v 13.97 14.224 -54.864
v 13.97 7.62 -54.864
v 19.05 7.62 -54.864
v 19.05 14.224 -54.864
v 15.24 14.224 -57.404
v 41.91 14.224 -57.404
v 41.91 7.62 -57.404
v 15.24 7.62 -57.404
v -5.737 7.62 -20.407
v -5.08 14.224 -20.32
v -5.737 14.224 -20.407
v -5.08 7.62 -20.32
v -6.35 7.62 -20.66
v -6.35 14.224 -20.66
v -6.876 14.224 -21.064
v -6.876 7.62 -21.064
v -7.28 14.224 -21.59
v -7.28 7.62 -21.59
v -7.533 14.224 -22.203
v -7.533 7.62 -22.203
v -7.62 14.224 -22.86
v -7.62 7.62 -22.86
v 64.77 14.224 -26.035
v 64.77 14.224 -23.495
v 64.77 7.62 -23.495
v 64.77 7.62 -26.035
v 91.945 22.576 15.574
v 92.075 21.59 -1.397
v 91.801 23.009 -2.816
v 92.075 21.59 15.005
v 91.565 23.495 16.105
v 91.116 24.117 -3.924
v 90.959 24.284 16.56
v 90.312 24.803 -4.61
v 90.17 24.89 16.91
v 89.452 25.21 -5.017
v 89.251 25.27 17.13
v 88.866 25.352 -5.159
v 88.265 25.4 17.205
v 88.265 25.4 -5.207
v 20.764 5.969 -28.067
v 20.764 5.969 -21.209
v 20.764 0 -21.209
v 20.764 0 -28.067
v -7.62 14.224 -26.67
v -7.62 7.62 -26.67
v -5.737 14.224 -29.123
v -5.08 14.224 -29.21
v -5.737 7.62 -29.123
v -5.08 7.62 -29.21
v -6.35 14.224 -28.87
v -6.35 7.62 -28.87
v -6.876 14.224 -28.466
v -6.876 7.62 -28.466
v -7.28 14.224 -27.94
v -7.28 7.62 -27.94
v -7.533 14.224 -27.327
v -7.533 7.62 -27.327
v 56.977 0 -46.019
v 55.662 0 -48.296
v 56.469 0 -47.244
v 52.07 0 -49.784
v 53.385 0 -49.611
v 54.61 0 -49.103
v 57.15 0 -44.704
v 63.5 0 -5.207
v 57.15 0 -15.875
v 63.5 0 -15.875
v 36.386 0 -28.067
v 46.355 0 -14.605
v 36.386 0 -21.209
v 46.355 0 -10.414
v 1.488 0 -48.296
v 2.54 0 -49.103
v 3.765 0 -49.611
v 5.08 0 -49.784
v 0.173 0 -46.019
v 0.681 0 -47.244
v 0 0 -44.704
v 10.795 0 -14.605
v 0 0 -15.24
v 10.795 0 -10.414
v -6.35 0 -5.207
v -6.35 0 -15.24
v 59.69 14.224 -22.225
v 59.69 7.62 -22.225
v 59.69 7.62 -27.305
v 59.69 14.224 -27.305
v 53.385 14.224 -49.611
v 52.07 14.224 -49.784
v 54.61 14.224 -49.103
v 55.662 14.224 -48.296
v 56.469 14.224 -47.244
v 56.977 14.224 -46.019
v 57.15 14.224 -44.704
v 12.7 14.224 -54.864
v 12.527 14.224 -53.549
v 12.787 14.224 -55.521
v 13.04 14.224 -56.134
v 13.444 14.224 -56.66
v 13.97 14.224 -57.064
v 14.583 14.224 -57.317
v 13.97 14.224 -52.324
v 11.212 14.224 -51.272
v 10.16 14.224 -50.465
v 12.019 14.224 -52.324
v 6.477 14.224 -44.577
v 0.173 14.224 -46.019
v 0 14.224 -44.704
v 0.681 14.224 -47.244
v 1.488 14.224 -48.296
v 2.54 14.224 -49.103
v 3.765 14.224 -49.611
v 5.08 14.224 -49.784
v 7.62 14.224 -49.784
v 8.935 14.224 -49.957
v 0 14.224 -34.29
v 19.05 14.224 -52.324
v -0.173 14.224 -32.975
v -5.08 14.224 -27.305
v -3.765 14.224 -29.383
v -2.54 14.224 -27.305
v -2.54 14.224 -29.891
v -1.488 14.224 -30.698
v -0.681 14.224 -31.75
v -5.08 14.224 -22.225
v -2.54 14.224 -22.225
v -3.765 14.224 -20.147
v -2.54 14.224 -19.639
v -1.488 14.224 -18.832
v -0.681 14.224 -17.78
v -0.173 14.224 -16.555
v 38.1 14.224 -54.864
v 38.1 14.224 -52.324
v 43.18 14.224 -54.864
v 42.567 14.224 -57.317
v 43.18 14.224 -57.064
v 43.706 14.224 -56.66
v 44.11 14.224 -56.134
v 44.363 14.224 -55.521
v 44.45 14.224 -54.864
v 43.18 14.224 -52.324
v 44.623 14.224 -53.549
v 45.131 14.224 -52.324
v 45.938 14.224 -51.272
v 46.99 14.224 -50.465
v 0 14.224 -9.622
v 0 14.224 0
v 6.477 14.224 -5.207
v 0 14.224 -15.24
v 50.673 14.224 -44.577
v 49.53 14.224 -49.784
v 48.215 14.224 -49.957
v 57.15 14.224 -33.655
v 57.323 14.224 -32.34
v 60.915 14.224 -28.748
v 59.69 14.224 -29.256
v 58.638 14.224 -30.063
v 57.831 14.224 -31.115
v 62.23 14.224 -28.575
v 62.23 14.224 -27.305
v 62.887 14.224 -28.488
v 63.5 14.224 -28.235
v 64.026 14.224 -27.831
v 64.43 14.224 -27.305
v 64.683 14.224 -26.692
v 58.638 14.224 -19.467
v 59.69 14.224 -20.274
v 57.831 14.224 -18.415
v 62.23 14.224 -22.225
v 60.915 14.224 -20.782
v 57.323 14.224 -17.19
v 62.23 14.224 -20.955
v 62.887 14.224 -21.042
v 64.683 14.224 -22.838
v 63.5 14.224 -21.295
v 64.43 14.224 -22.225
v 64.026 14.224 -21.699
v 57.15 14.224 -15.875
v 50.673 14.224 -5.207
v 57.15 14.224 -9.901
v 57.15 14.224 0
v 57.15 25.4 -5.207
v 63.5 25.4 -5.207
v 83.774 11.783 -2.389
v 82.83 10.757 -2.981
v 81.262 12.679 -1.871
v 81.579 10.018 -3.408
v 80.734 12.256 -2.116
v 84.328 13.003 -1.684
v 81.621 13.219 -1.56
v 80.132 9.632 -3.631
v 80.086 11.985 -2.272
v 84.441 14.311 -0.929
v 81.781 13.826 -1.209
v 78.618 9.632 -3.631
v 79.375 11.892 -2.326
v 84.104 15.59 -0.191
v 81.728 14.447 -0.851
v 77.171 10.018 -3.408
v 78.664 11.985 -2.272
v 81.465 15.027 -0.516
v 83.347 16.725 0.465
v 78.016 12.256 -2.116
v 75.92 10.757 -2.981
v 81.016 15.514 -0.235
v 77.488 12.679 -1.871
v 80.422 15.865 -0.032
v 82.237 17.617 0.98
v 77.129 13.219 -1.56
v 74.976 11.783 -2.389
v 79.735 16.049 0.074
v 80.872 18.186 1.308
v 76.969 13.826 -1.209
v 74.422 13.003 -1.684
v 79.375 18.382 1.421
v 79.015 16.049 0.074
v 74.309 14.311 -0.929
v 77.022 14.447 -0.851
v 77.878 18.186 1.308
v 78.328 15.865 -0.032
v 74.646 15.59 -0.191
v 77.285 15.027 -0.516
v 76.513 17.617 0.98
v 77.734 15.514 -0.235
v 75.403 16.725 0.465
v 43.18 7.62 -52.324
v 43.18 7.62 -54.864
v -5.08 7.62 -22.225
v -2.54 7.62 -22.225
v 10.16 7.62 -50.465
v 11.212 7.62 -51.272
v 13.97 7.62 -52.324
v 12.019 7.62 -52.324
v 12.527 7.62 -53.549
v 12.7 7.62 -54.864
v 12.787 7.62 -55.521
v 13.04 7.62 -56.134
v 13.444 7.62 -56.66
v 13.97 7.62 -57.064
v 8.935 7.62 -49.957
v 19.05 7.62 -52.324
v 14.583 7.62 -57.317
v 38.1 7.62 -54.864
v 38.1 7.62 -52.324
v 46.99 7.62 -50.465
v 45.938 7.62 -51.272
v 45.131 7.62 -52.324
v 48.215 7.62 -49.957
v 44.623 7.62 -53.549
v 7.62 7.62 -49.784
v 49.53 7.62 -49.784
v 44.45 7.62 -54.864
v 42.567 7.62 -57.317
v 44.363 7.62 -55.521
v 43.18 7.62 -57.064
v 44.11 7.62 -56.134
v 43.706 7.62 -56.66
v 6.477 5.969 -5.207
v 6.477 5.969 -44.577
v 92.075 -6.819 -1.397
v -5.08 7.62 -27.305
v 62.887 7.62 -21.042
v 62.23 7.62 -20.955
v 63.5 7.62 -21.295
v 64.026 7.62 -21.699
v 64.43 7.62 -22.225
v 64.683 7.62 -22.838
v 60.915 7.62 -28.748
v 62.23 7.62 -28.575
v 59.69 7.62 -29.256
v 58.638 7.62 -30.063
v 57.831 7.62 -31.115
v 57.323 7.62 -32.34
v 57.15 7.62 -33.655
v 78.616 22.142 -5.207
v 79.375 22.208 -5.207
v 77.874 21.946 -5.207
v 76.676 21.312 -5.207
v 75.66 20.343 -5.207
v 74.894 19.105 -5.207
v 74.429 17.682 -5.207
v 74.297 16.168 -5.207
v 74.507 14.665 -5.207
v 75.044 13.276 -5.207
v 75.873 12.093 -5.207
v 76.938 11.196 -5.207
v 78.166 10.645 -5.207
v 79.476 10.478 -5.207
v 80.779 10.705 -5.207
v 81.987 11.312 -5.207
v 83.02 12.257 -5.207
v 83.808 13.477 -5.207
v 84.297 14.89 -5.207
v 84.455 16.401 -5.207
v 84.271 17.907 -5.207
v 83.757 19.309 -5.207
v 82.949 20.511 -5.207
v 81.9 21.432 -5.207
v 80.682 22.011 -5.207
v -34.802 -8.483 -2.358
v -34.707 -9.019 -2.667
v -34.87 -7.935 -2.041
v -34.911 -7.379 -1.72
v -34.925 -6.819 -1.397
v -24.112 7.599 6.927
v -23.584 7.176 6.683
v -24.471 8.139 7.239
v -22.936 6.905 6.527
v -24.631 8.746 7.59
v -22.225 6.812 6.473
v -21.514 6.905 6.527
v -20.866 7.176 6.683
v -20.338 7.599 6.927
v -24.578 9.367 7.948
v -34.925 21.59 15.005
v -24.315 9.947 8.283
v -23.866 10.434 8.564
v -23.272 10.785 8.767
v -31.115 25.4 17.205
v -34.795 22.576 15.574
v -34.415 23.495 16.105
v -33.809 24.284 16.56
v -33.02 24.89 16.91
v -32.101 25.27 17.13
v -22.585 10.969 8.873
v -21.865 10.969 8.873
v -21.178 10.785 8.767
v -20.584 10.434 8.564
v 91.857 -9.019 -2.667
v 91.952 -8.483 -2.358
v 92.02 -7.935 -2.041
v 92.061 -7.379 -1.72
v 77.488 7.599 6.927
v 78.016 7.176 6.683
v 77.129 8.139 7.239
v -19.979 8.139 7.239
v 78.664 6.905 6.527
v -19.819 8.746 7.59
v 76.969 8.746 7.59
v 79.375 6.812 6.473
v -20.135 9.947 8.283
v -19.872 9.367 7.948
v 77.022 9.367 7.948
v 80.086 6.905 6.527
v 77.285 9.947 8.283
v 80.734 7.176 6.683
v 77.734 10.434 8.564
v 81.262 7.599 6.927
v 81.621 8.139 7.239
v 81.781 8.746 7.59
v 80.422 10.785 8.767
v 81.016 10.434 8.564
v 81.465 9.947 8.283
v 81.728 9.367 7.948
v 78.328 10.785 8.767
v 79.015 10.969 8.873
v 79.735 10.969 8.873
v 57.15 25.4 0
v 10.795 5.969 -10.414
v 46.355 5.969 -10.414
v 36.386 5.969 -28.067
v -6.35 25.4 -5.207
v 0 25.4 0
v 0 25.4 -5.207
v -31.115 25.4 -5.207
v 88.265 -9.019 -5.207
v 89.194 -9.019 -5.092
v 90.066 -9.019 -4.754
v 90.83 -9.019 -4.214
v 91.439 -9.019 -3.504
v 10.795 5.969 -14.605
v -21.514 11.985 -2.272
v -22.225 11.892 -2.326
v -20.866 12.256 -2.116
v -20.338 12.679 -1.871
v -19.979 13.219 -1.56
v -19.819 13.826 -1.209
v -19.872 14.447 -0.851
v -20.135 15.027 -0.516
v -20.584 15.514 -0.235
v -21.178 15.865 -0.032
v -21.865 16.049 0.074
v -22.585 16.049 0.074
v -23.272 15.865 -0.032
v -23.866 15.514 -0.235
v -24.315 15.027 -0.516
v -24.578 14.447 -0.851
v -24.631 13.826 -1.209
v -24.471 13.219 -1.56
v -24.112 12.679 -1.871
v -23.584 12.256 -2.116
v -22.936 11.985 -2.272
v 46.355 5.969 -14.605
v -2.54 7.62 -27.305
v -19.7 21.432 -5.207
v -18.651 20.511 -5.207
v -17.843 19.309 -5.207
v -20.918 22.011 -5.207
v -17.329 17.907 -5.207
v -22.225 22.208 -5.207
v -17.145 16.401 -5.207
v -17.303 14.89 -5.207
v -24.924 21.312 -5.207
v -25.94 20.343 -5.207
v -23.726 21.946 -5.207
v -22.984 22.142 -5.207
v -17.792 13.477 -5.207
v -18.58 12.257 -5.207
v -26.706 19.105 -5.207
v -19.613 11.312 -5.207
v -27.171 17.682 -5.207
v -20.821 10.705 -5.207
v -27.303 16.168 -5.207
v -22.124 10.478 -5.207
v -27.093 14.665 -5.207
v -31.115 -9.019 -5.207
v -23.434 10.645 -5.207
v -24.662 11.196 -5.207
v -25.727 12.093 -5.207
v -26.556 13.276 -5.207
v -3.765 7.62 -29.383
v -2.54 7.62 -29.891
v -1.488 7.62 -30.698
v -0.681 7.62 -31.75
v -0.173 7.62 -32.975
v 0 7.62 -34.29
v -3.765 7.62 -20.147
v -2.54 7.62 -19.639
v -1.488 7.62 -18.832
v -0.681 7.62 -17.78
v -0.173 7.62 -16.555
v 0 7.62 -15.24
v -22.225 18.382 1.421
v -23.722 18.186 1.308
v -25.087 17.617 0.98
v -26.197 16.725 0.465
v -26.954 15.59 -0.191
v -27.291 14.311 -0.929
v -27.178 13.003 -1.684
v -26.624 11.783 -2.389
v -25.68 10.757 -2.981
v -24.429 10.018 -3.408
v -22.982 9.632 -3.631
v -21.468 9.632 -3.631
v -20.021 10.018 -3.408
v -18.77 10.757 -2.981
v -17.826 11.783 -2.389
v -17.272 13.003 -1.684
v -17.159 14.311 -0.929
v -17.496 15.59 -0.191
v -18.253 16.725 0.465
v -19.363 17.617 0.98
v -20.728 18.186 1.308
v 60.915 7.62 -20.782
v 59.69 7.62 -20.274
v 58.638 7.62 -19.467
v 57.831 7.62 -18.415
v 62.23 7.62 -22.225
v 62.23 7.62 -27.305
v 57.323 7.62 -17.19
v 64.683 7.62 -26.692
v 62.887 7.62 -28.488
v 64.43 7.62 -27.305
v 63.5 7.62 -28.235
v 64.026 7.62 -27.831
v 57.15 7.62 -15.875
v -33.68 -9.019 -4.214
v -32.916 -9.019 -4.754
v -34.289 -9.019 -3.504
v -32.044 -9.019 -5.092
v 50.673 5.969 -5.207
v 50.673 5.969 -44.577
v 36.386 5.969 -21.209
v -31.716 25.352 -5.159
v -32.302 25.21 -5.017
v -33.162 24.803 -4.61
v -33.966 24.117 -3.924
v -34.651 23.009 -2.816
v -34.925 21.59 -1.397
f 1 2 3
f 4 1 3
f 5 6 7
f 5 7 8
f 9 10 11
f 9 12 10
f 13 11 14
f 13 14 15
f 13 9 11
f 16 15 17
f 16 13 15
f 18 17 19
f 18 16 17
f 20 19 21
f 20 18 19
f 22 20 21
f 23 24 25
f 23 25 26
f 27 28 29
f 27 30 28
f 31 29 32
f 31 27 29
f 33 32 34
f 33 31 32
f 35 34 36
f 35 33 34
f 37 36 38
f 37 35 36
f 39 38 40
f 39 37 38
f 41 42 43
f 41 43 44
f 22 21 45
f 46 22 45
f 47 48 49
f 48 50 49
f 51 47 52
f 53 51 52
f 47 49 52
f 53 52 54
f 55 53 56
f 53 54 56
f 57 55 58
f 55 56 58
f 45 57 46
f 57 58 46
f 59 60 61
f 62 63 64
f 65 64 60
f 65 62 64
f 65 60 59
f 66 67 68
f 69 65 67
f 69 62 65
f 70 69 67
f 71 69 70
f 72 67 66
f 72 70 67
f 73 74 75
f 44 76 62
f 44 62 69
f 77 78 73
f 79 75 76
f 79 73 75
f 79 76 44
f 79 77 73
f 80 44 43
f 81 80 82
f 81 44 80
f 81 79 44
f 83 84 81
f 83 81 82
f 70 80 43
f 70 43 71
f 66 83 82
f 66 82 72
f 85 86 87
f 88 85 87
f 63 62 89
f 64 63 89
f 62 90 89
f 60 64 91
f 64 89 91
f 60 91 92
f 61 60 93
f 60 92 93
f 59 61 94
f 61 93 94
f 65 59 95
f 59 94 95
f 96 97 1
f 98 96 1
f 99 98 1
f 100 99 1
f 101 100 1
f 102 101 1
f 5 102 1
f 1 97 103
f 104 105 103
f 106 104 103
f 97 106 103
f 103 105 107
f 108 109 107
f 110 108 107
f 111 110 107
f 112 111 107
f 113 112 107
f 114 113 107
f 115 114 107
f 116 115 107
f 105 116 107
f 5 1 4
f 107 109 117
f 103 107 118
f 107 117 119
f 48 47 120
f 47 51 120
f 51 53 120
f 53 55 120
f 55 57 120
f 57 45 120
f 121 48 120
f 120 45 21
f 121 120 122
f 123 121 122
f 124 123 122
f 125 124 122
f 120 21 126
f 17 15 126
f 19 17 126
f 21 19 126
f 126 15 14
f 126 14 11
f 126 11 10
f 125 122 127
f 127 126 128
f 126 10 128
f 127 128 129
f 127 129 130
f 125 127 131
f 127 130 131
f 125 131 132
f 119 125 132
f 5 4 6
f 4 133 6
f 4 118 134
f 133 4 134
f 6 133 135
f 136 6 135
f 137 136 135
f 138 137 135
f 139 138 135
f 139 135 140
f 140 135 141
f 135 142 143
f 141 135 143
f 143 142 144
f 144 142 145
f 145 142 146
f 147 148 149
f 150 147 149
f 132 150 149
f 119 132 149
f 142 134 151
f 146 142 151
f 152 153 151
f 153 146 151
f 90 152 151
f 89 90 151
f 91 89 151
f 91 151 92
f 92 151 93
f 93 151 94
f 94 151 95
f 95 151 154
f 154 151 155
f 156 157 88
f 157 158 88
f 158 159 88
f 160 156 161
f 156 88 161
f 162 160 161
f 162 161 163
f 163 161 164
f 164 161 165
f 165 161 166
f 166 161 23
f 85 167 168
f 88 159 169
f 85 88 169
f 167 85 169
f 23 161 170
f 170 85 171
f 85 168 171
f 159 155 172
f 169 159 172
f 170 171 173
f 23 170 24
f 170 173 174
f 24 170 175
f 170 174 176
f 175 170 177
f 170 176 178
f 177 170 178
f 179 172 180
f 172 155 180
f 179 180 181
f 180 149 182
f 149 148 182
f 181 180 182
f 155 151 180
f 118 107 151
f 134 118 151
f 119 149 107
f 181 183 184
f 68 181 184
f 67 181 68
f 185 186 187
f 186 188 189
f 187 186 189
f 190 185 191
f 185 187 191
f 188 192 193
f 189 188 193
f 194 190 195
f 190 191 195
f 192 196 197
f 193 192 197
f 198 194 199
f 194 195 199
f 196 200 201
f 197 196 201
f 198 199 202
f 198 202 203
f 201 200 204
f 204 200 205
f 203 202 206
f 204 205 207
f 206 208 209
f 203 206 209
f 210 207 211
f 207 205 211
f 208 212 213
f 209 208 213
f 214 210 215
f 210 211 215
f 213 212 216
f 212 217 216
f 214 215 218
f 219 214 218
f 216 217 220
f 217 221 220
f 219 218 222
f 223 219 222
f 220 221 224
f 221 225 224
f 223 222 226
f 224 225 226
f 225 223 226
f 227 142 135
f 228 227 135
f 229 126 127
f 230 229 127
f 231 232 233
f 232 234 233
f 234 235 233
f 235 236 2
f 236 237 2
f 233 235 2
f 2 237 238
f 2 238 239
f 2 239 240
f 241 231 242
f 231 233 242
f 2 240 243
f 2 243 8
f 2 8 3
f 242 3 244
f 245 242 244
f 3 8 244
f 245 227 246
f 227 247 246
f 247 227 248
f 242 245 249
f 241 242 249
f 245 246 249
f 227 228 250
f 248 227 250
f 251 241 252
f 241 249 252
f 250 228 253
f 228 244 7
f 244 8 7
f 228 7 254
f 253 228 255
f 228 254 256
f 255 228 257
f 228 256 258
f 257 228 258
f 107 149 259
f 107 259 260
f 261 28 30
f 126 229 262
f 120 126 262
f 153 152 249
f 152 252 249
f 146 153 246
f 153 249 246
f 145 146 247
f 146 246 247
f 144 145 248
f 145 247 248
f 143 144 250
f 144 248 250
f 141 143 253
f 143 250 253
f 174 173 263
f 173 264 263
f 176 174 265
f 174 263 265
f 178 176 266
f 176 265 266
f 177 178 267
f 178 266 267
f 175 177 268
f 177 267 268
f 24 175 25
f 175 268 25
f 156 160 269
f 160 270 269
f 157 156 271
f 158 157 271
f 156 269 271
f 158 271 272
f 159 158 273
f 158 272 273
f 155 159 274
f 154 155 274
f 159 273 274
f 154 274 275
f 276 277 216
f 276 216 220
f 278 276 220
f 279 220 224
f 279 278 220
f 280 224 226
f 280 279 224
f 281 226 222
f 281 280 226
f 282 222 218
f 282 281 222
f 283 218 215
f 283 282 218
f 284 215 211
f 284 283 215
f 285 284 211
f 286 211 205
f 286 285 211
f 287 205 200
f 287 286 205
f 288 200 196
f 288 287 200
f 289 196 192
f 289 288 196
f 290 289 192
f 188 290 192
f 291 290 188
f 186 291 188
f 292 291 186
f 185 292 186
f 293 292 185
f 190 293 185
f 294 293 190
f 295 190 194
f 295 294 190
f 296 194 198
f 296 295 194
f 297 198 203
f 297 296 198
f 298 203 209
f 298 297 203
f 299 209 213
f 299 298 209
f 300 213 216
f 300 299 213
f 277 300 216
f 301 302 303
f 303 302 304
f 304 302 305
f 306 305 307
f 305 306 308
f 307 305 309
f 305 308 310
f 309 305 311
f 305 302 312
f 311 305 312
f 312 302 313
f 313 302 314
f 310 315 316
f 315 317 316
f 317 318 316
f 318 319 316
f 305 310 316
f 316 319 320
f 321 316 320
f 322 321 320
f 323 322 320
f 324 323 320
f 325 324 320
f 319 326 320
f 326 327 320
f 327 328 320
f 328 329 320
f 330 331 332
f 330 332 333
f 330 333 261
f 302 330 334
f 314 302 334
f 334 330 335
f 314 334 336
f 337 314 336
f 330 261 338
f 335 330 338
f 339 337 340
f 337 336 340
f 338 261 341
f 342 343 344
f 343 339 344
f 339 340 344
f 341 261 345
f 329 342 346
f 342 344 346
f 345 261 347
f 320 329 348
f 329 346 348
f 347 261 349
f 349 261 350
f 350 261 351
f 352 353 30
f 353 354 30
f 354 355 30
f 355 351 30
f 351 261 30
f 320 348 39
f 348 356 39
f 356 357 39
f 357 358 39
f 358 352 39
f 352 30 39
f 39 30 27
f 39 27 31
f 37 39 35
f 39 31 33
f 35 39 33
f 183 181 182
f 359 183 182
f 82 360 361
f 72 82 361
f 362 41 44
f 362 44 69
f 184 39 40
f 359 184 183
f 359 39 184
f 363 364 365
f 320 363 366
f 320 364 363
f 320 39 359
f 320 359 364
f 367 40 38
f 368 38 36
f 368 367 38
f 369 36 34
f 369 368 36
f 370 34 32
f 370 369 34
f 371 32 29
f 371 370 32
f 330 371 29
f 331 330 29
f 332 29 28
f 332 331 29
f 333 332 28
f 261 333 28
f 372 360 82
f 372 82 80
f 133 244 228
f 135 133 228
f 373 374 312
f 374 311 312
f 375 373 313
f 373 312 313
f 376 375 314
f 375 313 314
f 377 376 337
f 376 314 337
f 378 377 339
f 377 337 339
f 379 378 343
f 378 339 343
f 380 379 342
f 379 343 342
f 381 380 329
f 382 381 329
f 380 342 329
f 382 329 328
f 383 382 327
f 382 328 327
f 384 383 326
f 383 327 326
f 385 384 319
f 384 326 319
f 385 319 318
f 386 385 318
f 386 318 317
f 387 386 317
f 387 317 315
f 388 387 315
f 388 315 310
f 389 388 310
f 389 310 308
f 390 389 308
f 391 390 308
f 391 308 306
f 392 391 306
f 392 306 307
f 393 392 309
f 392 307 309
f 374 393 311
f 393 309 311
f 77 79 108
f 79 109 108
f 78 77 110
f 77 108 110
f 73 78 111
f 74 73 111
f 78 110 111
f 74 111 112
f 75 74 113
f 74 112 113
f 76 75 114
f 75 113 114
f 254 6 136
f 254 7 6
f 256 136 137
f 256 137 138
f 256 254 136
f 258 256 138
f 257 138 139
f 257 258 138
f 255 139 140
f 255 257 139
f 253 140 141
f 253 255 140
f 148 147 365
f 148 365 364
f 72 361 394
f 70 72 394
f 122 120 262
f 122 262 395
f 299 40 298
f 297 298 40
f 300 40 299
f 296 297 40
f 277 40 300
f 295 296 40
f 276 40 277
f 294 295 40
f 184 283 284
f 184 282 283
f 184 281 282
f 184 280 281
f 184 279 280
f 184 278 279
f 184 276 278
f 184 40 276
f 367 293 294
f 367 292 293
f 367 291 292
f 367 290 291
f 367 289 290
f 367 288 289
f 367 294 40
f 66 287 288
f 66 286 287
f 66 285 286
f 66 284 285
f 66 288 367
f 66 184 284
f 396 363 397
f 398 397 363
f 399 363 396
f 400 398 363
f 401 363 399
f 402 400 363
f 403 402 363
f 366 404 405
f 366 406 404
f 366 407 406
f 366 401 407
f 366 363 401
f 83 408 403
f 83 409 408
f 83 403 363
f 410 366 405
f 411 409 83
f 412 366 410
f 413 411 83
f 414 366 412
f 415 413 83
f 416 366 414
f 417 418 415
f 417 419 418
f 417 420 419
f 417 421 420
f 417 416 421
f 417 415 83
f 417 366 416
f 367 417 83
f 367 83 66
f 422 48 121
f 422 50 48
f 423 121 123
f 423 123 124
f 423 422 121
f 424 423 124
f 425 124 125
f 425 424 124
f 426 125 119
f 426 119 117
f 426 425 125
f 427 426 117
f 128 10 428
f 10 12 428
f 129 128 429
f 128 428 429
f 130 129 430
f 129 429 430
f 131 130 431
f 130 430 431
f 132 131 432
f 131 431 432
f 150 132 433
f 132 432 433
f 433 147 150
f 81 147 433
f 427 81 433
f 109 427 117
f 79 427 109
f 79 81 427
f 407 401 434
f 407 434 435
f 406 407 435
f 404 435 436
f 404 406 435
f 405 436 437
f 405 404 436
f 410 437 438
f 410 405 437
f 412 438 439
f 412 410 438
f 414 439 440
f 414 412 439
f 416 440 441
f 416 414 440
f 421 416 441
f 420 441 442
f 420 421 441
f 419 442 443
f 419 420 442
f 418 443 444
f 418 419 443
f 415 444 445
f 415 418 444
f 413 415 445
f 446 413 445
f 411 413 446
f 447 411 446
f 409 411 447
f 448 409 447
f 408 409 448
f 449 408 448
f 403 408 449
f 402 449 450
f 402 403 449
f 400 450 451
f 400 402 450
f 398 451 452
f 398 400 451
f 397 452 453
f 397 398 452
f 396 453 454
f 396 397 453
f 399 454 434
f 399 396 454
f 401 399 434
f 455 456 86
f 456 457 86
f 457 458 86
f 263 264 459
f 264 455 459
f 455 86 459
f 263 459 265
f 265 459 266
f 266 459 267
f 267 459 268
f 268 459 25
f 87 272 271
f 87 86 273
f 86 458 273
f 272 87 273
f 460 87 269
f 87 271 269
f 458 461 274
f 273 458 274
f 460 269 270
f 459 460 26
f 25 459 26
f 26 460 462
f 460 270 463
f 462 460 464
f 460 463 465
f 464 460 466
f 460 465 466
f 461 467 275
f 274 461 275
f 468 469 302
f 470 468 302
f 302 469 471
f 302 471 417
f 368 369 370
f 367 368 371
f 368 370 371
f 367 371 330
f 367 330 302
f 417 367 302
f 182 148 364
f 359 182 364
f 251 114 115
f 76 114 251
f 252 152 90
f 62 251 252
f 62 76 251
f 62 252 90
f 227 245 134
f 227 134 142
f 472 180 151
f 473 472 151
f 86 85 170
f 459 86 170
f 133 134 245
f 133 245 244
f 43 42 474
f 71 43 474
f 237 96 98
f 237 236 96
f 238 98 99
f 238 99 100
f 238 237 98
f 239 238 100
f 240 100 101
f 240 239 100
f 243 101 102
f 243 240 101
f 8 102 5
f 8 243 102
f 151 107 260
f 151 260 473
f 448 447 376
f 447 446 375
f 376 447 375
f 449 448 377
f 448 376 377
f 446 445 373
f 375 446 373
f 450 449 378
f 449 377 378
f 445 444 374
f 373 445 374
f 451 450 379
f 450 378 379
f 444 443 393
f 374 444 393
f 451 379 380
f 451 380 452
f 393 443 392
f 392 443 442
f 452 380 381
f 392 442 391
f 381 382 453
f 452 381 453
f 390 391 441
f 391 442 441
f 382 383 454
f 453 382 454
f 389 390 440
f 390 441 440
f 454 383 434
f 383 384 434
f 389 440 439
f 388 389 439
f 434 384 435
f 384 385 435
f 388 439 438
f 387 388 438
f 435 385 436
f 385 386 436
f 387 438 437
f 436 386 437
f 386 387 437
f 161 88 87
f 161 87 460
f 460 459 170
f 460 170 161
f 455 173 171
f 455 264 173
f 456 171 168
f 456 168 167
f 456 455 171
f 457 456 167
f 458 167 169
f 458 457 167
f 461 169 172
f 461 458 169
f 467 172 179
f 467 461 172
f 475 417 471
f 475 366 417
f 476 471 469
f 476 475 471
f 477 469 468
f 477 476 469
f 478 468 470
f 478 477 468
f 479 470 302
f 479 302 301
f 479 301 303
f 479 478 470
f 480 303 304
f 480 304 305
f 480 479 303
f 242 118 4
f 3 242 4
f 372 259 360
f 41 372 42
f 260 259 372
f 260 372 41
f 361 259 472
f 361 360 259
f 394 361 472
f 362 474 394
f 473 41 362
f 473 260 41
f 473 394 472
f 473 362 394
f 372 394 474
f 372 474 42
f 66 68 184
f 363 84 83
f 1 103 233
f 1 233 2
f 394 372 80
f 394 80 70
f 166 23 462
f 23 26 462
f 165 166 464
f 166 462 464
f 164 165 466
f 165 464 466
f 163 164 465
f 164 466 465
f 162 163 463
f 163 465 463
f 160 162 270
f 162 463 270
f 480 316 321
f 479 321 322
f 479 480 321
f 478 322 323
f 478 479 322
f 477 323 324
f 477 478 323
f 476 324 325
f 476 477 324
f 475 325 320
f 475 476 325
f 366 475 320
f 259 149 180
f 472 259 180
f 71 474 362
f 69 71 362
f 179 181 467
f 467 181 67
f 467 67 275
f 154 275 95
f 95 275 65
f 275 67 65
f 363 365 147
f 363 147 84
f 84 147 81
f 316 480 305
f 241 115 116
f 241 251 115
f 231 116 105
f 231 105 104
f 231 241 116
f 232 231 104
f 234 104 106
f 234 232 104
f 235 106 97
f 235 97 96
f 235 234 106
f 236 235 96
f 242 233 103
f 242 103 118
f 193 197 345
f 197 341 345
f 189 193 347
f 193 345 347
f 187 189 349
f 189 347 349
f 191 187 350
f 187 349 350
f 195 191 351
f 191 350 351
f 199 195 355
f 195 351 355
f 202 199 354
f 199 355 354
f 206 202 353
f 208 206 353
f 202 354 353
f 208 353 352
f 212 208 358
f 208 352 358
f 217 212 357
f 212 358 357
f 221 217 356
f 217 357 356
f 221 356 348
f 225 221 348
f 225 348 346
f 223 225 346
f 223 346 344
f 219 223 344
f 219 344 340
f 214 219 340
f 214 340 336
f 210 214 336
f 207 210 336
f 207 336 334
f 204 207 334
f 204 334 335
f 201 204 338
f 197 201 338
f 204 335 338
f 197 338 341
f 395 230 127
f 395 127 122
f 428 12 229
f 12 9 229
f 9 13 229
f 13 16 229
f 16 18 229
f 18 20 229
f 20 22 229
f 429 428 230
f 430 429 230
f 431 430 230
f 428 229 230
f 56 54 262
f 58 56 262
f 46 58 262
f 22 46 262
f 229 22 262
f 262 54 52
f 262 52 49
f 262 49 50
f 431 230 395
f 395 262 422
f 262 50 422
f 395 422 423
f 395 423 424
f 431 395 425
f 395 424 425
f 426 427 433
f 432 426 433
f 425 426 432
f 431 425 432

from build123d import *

# Parameters (mm, degrees)
SKETCH2_W           = 57.15
SKETCH2_H           = 49.784
BOSS_EXTRUDE1_DEPTH = 14.224
SKETCH3_W           = 44.196
SKETCH3_H           = 39.37
CUT_EXTRUDE1_DEPTH  = 8.255
SKETCH4_W           = 35.56
SKETCH4_H           = 4.191
SKETCH4_W_2         = 15.621
SKETCH4_H_2         = 6.858
CUT_EXTRUDE2_DEPTH  = 8.255
SKETCH5_W           = 7.62
SKETCH5_H           = 8.89
SKETCH5_H_2         = 7.62
BOSS_EXTRUDE2_DEPTH = 6.604
SKETCH6_W           = 2.54
SKETCH6_H           = 5.08
SKETCH6_W_2         = 5.08
SKETCH6_H_2         = 2.54
CUT_EXTRUDE3_DEPTH  = 6.604
FILLET1_R           = 5.08
FILLET2_R           = 2.54
SKETCH7_W           = 127
SKETCH7_H           = 14.224
SKETCH7_R           = 2.38125
BOSS_EXTRUDE3_DEPTH = 5.207
BOSS_EXTRUDE4_DEPTH = 127
SKETCH11_W          = 34.925
SKETCH11_H          = 11.176
BOSS_EXTRUDE5_DEPTH = 5.207
SKETCH9_R           = 2.413
CUT_EXTRUDE4_DEPTH  = 25.4
FILLET3_R           = 5.08
FILLET4_R           = 5.08
BOSS_EXTRUDE6_DEPTH = 6.35
BOSS_EXTRUDE7_DEPTH = 6.35
BOSS_EXTRUDE8_DEPTH = 127
BOSS_EXTRUDE9_DEPTH = 127
CUT_EXTRUDE6_START  = -2.199704526
SKETCH16_R          = 2.413
CUT_EXTRUDE6_DEPTH  = 2.199704526
CUT_EXTRUDE9_START  = -17.813215
SKETCH17_R          = 5.08
CUT_EXTRUDE9_DEPTH  = 7.653215
FILLET5_R           = 3.81


with BuildPart() as part:
    # Sketch2 → Boss-Extrude1 (new body)
    with BuildSketch(Plane(origin=(0, 0, 0), x_dir=(1, 0, 0), z_dir=(0, 1, 0))):
        with Locations((28.575, 24.892)):
            Rectangle(SKETCH2_W, SKETCH2_H)
    extrude(amount=BOSS_EXTRUDE1_DEPTH)

    # Sketch3 → Cut-Extrude1 (cut)
    with BuildSketch(Plane(origin=(0, 14.224, 0), x_dir=(1, 0, 0), z_dir=(0, 1, 0))):
        with Locations((28.575, 24.892)):
            Rectangle(SKETCH3_W, SKETCH3_H)
    extrude(amount=-CUT_EXTRUDE1_DEPTH, mode=Mode.SUBTRACT)

    # Sketch4 → Cut-Extrude2 (cut)
    with BuildSketch(Plane(origin=(0, 5.969, 0), x_dir=(1, 0, 0), z_dir=(0, 1, 0))):
        with Locations((28.575, 12.5095)):
            Rectangle(SKETCH4_W, SKETCH4_H)
        with Locations((28.575, 24.638)):
            Rectangle(SKETCH4_W_2, SKETCH4_H_2)
    extrude(amount=-CUT_EXTRUDE2_DEPTH, mode=Mode.SUBTRACT)

    # Sketch5 → Boss-Extrude2 (add)
    with BuildSketch(Plane(origin=(0, 14.224, 0), x_dir=(1, 0, 0), z_dir=(0, 1, 0))):
        with Locations((-3.81, 24.765)):
            Rectangle(SKETCH5_W, SKETCH5_H)
        Polygon((12.7, 49.784), (36.83, 49.784), (44.45, 49.784), (44.45, 57.404), (36.83, 57.404), (12.7, 57.404), align=None)
        with Locations((60.96, 24.765)):
            Rectangle(SKETCH5_W, SKETCH5_H_2)
    extrude(amount=-BOSS_EXTRUDE2_DEPTH)

    # Sketch6 → Cut-Extrude3 (cut)
    with BuildSketch(Plane(origin=(0, 14.224, 0), x_dir=(1, 0, 0), z_dir=(0, 1, 0))):
        with Locations((-3.81, 24.765)):
            Rectangle(SKETCH6_W, SKETCH6_H)
        with Locations((60.96, 24.765)):
            Rectangle(SKETCH6_W, SKETCH6_H)
        with Locations((16.51, 53.594)):
            Rectangle(SKETCH6_W_2, SKETCH6_H_2)
        with Locations((40.64, 53.594)):
            Rectangle(SKETCH6_W_2, SKETCH6_H_2)
    extrude(amount=-CUT_EXTRUDE3_DEPTH, mode=Mode.SUBTRACT)

    # Fillet1
    fillet1_edges = [part.edges().sort_by_distance(p)[0] for p in [
        (0, 7.112, -49.784),
        (57.15, 7.112, -49.784),
        (57.15, 7.112, 0),
        (0, 7.112, 0),
    ]]
    fillet(fillet1_edges, radius=FILLET1_R)

    # Fillet2
    fillet2_edges = [part.edges().sort_by_distance(p)[0] for p in [
        (-7.62, 10.922, -20.32),
        (-7.62, 10.922, -29.21),
        (12.7, 10.922, -57.404),
        (44.45, 10.922, -57.404),
        (64.77, 10.922, -28.575),
        (64.77, 10.922, -20.955),
    ]]
    fillet(fillet2_edges, radius=FILLET2_R)

    # Sketch7 → Boss-Extrude3 (add)
    with BuildSketch(Plane.XY):
        with Locations((28.575, 7.112)):
            Rectangle(SKETCH7_W, SKETCH7_H)
        with Locations((-30.861, 7.112)):
            Circle(SKETCH7_R, mode=Mode.SUBTRACT)
        with Locations((88.011, 7.112)):
            Circle(SKETCH7_R, mode=Mode.SUBTRACT)
    extrude(amount=-BOSS_EXTRUDE3_DEPTH)

    # Sketch8 → Boss-Extrude4 (add)
    with BuildSketch(Plane.ZY.offset(34.925)):
        Polygon((0, 25.4), (14.664696837, 25.4), (0, 0), (-5.207, 0), (-5.207, 14.224), (0, 14.224), align=None)
    extrude(amount=-BOSS_EXTRUDE4_DEPTH)

    # Sketch11 → Boss-Extrude5 (add)
    with BuildSketch(Plane(origin=(0, 0, 0), x_dir=(-1, 0, 0), z_dir=(0, 0, -1))):
        with Locations((17.4625, 19.812)):
            Rectangle(SKETCH11_W, SKETCH11_H)
        with Locations((-74.6125, 19.812)):
            Rectangle(SKETCH11_W, SKETCH11_H)
    extrude(amount=BOSS_EXTRUDE5_DEPTH)

    # Sketch9 → Cut-Extrude4 (cut, symmetric)
    with BuildSketch(Plane(origin=(0, 0, 0), x_dir=(1, 0, 0), z_dir=(0, -0.5000000000000043, 0.8660254037844363))):
        with Locations(Location((-22.225, 11.549393675, 0), (0, 0, 270))):
            Circle(SKETCH9_R)
        with Locations(Location((79.375, 11.549393675, 0), (0, 0, 270))):
            Circle(SKETCH9_R)
    extrude(amount=CUT_EXTRUDE4_DEPTH, both=True, mode=Mode.SUBTRACT)

    # Fillet3
    fillet3_edges = [part.edges().sort_by_distance(p)[0] for p in [
        (44.45, 10.922, -49.784),
        (12.7, 10.922, -49.784),
    ]]
    fillet(fillet3_edges, radius=FILLET3_R - 0.0001)  # a hair under: the kernel refuses the full size

    # Fillet4
    fillet4_edges = [part.edges().sort_by_distance(p)[0] for p in [
        (57.15, 10.922, -20.955),
        (57.15, 10.922, -28.575),
        (0, 10.922, -29.21),
        (0, 10.922, -20.32),
    ]]
    fillet(fillet4_edges, radius=FILLET4_R - 0.0001)  # a hair under: the kernel refuses the full size

    # Sketch12 → Boss-Extrude6 (add)
    with BuildSketch(Plane.ZY):
        Polygon((-5.207, 25.4), (-15.24, 0), (-5.207, 0), align=None)
    extrude(amount=BOSS_EXTRUDE6_DEPTH)

    # Sketch13 → Boss-Extrude7 (add)
    with BuildSketch(Plane(origin=(57.15, 0, 0), x_dir=(0, 0, -1), z_dir=(1, 0, 0))):
        Polygon((5.207, 25.4), (15.875, 0), (5.207, 0), align=None)
    extrude(amount=BOSS_EXTRUDE7_DEPTH)

    # Sketch14 → Boss-Extrude8 (add)
    with BuildSketch(Plane.ZY.offset(34.925)):
        Polygon((-5.207, 0), (-5.207, -9.018788555), (0, 0), align=None)
    extrude(amount=-BOSS_EXTRUDE8_DEPTH)

    # Sketch15 → Boss-Extrude9 (add)
    with BuildSketch(Plane(origin=(92.075, 0, 0), x_dir=(0, 0, -1), z_dir=(1, 0, 0))):
        Polygon((5.207, -9.018788555), (2.667, -9.018788555), (-17.204696837, 25.4), (-14.664696837, 25.4), align=None)
    extrude(amount=-BOSS_EXTRUDE9_DEPTH)

    # Sketch16 → Cut-Extrude6 (cut)
    with BuildSketch(Plane(origin=(0, 0, 0), x_dir=(-1, 0, 0), z_dir=(0, 0.5000000000000031, -0.8660254037844369)).offset(CUT_EXTRUDE6_START)):
        with Locations(Location((-79.375, 11.549393675, 0), (0, 0, 270))):
            Circle(SKETCH16_R)
        with Locations(Location((22.225, 11.549393675, 0), (0, 0, 270))):
            Circle(SKETCH16_R)
    extrude(amount=CUT_EXTRUDE6_DEPTH, mode=Mode.SUBTRACT)

    # Sketch17 → Cut-Extrude9 (cut)
    with BuildSketch(Plane(origin=(0, -1.099852263, 1.905), x_dir=(1, 0, 0), z_dir=(0, -0.500000000000003, 0.8660254037844369)).offset(CUT_EXTRUDE9_START)):
        with Locations(Location((79.375, 11.549393675, 0), (0, 0, 90))):
            Circle(SKETCH17_R)
        with Locations(Location((-22.225, 11.549393675, 0), (0, 0, 90))):
            Circle(SKETCH17_R)
    extrude(amount=CUT_EXTRUDE9_DEPTH, mode=Mode.SUBTRACT)

    # Fillet5
    fillet5_edges = [part.edges().sort_by_distance(p)[0] for p in [
        (92.075, 25.4, 5.998848419),
        (92.075, 8.190605722, -5.207),
        (-34.925, 25.4, 5.998848419),
        (-34.925, 8.190605722, -5.207),
    ]]
    fillet(fillet5_edges, radius=FILLET5_R)


solid = part.part
